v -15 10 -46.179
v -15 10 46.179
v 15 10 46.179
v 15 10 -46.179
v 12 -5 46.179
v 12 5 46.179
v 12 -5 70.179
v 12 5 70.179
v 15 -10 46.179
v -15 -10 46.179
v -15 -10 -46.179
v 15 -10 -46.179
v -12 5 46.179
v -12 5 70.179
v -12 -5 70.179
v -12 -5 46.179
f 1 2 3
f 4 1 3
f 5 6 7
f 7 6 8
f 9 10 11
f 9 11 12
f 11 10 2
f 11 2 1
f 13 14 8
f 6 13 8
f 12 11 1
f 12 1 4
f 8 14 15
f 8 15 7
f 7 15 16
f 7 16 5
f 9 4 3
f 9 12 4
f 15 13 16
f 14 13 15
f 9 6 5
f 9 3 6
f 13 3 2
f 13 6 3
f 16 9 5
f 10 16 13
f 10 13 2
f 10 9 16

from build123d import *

# Parameters (mm, degrees)
F1_DEPTH = 10
F2_DEPTH = 10
F0_W     = 24
F0_H     = 24
F3_DEPTH = 5
F4_DEPTH = 5


with BuildPart() as f1:
    # F0 (on Front) → F1 (new body)
    with BuildSketch(Plane.XZ):
        Polygon((15, 46.178577), (12, 46.178577), (-12, 46.178577), (-15, 46.178577), (-15, -20.821423), (-15, -46.178577), (0, -46.178577), (15, -46.178577), (15, -20.821423), align=None)
    extrude(amount=F1_DEPTH)

    # F0 (on Front) → F2 (join)
    with BuildSketch(Plane.XZ):
        Polygon((15, 46.178577), (12, 46.178577), (-12, 46.178577), (-15, 46.178577), (-15, -20.821423), (-15, -46.178577), (0, -46.178577), (15, -46.178577), (15, -20.821423), align=None)
    extrude(amount=-F2_DEPTH)

    # F0 (on Front) → F3 (join)
    with BuildSketch(Plane.XZ):
        with Locations((0, 58.178577)):
            Rectangle(F0_W, F0_H)
    extrude(amount=-F3_DEPTH)

    # F0 (on Front) → F4 (join)
    with BuildSketch(Plane.XZ):
        with Locations((0, 58.178577)):
            Rectangle(F0_W, F0_H)
    extrude(amount=F4_DEPTH)


solid = f1.part
